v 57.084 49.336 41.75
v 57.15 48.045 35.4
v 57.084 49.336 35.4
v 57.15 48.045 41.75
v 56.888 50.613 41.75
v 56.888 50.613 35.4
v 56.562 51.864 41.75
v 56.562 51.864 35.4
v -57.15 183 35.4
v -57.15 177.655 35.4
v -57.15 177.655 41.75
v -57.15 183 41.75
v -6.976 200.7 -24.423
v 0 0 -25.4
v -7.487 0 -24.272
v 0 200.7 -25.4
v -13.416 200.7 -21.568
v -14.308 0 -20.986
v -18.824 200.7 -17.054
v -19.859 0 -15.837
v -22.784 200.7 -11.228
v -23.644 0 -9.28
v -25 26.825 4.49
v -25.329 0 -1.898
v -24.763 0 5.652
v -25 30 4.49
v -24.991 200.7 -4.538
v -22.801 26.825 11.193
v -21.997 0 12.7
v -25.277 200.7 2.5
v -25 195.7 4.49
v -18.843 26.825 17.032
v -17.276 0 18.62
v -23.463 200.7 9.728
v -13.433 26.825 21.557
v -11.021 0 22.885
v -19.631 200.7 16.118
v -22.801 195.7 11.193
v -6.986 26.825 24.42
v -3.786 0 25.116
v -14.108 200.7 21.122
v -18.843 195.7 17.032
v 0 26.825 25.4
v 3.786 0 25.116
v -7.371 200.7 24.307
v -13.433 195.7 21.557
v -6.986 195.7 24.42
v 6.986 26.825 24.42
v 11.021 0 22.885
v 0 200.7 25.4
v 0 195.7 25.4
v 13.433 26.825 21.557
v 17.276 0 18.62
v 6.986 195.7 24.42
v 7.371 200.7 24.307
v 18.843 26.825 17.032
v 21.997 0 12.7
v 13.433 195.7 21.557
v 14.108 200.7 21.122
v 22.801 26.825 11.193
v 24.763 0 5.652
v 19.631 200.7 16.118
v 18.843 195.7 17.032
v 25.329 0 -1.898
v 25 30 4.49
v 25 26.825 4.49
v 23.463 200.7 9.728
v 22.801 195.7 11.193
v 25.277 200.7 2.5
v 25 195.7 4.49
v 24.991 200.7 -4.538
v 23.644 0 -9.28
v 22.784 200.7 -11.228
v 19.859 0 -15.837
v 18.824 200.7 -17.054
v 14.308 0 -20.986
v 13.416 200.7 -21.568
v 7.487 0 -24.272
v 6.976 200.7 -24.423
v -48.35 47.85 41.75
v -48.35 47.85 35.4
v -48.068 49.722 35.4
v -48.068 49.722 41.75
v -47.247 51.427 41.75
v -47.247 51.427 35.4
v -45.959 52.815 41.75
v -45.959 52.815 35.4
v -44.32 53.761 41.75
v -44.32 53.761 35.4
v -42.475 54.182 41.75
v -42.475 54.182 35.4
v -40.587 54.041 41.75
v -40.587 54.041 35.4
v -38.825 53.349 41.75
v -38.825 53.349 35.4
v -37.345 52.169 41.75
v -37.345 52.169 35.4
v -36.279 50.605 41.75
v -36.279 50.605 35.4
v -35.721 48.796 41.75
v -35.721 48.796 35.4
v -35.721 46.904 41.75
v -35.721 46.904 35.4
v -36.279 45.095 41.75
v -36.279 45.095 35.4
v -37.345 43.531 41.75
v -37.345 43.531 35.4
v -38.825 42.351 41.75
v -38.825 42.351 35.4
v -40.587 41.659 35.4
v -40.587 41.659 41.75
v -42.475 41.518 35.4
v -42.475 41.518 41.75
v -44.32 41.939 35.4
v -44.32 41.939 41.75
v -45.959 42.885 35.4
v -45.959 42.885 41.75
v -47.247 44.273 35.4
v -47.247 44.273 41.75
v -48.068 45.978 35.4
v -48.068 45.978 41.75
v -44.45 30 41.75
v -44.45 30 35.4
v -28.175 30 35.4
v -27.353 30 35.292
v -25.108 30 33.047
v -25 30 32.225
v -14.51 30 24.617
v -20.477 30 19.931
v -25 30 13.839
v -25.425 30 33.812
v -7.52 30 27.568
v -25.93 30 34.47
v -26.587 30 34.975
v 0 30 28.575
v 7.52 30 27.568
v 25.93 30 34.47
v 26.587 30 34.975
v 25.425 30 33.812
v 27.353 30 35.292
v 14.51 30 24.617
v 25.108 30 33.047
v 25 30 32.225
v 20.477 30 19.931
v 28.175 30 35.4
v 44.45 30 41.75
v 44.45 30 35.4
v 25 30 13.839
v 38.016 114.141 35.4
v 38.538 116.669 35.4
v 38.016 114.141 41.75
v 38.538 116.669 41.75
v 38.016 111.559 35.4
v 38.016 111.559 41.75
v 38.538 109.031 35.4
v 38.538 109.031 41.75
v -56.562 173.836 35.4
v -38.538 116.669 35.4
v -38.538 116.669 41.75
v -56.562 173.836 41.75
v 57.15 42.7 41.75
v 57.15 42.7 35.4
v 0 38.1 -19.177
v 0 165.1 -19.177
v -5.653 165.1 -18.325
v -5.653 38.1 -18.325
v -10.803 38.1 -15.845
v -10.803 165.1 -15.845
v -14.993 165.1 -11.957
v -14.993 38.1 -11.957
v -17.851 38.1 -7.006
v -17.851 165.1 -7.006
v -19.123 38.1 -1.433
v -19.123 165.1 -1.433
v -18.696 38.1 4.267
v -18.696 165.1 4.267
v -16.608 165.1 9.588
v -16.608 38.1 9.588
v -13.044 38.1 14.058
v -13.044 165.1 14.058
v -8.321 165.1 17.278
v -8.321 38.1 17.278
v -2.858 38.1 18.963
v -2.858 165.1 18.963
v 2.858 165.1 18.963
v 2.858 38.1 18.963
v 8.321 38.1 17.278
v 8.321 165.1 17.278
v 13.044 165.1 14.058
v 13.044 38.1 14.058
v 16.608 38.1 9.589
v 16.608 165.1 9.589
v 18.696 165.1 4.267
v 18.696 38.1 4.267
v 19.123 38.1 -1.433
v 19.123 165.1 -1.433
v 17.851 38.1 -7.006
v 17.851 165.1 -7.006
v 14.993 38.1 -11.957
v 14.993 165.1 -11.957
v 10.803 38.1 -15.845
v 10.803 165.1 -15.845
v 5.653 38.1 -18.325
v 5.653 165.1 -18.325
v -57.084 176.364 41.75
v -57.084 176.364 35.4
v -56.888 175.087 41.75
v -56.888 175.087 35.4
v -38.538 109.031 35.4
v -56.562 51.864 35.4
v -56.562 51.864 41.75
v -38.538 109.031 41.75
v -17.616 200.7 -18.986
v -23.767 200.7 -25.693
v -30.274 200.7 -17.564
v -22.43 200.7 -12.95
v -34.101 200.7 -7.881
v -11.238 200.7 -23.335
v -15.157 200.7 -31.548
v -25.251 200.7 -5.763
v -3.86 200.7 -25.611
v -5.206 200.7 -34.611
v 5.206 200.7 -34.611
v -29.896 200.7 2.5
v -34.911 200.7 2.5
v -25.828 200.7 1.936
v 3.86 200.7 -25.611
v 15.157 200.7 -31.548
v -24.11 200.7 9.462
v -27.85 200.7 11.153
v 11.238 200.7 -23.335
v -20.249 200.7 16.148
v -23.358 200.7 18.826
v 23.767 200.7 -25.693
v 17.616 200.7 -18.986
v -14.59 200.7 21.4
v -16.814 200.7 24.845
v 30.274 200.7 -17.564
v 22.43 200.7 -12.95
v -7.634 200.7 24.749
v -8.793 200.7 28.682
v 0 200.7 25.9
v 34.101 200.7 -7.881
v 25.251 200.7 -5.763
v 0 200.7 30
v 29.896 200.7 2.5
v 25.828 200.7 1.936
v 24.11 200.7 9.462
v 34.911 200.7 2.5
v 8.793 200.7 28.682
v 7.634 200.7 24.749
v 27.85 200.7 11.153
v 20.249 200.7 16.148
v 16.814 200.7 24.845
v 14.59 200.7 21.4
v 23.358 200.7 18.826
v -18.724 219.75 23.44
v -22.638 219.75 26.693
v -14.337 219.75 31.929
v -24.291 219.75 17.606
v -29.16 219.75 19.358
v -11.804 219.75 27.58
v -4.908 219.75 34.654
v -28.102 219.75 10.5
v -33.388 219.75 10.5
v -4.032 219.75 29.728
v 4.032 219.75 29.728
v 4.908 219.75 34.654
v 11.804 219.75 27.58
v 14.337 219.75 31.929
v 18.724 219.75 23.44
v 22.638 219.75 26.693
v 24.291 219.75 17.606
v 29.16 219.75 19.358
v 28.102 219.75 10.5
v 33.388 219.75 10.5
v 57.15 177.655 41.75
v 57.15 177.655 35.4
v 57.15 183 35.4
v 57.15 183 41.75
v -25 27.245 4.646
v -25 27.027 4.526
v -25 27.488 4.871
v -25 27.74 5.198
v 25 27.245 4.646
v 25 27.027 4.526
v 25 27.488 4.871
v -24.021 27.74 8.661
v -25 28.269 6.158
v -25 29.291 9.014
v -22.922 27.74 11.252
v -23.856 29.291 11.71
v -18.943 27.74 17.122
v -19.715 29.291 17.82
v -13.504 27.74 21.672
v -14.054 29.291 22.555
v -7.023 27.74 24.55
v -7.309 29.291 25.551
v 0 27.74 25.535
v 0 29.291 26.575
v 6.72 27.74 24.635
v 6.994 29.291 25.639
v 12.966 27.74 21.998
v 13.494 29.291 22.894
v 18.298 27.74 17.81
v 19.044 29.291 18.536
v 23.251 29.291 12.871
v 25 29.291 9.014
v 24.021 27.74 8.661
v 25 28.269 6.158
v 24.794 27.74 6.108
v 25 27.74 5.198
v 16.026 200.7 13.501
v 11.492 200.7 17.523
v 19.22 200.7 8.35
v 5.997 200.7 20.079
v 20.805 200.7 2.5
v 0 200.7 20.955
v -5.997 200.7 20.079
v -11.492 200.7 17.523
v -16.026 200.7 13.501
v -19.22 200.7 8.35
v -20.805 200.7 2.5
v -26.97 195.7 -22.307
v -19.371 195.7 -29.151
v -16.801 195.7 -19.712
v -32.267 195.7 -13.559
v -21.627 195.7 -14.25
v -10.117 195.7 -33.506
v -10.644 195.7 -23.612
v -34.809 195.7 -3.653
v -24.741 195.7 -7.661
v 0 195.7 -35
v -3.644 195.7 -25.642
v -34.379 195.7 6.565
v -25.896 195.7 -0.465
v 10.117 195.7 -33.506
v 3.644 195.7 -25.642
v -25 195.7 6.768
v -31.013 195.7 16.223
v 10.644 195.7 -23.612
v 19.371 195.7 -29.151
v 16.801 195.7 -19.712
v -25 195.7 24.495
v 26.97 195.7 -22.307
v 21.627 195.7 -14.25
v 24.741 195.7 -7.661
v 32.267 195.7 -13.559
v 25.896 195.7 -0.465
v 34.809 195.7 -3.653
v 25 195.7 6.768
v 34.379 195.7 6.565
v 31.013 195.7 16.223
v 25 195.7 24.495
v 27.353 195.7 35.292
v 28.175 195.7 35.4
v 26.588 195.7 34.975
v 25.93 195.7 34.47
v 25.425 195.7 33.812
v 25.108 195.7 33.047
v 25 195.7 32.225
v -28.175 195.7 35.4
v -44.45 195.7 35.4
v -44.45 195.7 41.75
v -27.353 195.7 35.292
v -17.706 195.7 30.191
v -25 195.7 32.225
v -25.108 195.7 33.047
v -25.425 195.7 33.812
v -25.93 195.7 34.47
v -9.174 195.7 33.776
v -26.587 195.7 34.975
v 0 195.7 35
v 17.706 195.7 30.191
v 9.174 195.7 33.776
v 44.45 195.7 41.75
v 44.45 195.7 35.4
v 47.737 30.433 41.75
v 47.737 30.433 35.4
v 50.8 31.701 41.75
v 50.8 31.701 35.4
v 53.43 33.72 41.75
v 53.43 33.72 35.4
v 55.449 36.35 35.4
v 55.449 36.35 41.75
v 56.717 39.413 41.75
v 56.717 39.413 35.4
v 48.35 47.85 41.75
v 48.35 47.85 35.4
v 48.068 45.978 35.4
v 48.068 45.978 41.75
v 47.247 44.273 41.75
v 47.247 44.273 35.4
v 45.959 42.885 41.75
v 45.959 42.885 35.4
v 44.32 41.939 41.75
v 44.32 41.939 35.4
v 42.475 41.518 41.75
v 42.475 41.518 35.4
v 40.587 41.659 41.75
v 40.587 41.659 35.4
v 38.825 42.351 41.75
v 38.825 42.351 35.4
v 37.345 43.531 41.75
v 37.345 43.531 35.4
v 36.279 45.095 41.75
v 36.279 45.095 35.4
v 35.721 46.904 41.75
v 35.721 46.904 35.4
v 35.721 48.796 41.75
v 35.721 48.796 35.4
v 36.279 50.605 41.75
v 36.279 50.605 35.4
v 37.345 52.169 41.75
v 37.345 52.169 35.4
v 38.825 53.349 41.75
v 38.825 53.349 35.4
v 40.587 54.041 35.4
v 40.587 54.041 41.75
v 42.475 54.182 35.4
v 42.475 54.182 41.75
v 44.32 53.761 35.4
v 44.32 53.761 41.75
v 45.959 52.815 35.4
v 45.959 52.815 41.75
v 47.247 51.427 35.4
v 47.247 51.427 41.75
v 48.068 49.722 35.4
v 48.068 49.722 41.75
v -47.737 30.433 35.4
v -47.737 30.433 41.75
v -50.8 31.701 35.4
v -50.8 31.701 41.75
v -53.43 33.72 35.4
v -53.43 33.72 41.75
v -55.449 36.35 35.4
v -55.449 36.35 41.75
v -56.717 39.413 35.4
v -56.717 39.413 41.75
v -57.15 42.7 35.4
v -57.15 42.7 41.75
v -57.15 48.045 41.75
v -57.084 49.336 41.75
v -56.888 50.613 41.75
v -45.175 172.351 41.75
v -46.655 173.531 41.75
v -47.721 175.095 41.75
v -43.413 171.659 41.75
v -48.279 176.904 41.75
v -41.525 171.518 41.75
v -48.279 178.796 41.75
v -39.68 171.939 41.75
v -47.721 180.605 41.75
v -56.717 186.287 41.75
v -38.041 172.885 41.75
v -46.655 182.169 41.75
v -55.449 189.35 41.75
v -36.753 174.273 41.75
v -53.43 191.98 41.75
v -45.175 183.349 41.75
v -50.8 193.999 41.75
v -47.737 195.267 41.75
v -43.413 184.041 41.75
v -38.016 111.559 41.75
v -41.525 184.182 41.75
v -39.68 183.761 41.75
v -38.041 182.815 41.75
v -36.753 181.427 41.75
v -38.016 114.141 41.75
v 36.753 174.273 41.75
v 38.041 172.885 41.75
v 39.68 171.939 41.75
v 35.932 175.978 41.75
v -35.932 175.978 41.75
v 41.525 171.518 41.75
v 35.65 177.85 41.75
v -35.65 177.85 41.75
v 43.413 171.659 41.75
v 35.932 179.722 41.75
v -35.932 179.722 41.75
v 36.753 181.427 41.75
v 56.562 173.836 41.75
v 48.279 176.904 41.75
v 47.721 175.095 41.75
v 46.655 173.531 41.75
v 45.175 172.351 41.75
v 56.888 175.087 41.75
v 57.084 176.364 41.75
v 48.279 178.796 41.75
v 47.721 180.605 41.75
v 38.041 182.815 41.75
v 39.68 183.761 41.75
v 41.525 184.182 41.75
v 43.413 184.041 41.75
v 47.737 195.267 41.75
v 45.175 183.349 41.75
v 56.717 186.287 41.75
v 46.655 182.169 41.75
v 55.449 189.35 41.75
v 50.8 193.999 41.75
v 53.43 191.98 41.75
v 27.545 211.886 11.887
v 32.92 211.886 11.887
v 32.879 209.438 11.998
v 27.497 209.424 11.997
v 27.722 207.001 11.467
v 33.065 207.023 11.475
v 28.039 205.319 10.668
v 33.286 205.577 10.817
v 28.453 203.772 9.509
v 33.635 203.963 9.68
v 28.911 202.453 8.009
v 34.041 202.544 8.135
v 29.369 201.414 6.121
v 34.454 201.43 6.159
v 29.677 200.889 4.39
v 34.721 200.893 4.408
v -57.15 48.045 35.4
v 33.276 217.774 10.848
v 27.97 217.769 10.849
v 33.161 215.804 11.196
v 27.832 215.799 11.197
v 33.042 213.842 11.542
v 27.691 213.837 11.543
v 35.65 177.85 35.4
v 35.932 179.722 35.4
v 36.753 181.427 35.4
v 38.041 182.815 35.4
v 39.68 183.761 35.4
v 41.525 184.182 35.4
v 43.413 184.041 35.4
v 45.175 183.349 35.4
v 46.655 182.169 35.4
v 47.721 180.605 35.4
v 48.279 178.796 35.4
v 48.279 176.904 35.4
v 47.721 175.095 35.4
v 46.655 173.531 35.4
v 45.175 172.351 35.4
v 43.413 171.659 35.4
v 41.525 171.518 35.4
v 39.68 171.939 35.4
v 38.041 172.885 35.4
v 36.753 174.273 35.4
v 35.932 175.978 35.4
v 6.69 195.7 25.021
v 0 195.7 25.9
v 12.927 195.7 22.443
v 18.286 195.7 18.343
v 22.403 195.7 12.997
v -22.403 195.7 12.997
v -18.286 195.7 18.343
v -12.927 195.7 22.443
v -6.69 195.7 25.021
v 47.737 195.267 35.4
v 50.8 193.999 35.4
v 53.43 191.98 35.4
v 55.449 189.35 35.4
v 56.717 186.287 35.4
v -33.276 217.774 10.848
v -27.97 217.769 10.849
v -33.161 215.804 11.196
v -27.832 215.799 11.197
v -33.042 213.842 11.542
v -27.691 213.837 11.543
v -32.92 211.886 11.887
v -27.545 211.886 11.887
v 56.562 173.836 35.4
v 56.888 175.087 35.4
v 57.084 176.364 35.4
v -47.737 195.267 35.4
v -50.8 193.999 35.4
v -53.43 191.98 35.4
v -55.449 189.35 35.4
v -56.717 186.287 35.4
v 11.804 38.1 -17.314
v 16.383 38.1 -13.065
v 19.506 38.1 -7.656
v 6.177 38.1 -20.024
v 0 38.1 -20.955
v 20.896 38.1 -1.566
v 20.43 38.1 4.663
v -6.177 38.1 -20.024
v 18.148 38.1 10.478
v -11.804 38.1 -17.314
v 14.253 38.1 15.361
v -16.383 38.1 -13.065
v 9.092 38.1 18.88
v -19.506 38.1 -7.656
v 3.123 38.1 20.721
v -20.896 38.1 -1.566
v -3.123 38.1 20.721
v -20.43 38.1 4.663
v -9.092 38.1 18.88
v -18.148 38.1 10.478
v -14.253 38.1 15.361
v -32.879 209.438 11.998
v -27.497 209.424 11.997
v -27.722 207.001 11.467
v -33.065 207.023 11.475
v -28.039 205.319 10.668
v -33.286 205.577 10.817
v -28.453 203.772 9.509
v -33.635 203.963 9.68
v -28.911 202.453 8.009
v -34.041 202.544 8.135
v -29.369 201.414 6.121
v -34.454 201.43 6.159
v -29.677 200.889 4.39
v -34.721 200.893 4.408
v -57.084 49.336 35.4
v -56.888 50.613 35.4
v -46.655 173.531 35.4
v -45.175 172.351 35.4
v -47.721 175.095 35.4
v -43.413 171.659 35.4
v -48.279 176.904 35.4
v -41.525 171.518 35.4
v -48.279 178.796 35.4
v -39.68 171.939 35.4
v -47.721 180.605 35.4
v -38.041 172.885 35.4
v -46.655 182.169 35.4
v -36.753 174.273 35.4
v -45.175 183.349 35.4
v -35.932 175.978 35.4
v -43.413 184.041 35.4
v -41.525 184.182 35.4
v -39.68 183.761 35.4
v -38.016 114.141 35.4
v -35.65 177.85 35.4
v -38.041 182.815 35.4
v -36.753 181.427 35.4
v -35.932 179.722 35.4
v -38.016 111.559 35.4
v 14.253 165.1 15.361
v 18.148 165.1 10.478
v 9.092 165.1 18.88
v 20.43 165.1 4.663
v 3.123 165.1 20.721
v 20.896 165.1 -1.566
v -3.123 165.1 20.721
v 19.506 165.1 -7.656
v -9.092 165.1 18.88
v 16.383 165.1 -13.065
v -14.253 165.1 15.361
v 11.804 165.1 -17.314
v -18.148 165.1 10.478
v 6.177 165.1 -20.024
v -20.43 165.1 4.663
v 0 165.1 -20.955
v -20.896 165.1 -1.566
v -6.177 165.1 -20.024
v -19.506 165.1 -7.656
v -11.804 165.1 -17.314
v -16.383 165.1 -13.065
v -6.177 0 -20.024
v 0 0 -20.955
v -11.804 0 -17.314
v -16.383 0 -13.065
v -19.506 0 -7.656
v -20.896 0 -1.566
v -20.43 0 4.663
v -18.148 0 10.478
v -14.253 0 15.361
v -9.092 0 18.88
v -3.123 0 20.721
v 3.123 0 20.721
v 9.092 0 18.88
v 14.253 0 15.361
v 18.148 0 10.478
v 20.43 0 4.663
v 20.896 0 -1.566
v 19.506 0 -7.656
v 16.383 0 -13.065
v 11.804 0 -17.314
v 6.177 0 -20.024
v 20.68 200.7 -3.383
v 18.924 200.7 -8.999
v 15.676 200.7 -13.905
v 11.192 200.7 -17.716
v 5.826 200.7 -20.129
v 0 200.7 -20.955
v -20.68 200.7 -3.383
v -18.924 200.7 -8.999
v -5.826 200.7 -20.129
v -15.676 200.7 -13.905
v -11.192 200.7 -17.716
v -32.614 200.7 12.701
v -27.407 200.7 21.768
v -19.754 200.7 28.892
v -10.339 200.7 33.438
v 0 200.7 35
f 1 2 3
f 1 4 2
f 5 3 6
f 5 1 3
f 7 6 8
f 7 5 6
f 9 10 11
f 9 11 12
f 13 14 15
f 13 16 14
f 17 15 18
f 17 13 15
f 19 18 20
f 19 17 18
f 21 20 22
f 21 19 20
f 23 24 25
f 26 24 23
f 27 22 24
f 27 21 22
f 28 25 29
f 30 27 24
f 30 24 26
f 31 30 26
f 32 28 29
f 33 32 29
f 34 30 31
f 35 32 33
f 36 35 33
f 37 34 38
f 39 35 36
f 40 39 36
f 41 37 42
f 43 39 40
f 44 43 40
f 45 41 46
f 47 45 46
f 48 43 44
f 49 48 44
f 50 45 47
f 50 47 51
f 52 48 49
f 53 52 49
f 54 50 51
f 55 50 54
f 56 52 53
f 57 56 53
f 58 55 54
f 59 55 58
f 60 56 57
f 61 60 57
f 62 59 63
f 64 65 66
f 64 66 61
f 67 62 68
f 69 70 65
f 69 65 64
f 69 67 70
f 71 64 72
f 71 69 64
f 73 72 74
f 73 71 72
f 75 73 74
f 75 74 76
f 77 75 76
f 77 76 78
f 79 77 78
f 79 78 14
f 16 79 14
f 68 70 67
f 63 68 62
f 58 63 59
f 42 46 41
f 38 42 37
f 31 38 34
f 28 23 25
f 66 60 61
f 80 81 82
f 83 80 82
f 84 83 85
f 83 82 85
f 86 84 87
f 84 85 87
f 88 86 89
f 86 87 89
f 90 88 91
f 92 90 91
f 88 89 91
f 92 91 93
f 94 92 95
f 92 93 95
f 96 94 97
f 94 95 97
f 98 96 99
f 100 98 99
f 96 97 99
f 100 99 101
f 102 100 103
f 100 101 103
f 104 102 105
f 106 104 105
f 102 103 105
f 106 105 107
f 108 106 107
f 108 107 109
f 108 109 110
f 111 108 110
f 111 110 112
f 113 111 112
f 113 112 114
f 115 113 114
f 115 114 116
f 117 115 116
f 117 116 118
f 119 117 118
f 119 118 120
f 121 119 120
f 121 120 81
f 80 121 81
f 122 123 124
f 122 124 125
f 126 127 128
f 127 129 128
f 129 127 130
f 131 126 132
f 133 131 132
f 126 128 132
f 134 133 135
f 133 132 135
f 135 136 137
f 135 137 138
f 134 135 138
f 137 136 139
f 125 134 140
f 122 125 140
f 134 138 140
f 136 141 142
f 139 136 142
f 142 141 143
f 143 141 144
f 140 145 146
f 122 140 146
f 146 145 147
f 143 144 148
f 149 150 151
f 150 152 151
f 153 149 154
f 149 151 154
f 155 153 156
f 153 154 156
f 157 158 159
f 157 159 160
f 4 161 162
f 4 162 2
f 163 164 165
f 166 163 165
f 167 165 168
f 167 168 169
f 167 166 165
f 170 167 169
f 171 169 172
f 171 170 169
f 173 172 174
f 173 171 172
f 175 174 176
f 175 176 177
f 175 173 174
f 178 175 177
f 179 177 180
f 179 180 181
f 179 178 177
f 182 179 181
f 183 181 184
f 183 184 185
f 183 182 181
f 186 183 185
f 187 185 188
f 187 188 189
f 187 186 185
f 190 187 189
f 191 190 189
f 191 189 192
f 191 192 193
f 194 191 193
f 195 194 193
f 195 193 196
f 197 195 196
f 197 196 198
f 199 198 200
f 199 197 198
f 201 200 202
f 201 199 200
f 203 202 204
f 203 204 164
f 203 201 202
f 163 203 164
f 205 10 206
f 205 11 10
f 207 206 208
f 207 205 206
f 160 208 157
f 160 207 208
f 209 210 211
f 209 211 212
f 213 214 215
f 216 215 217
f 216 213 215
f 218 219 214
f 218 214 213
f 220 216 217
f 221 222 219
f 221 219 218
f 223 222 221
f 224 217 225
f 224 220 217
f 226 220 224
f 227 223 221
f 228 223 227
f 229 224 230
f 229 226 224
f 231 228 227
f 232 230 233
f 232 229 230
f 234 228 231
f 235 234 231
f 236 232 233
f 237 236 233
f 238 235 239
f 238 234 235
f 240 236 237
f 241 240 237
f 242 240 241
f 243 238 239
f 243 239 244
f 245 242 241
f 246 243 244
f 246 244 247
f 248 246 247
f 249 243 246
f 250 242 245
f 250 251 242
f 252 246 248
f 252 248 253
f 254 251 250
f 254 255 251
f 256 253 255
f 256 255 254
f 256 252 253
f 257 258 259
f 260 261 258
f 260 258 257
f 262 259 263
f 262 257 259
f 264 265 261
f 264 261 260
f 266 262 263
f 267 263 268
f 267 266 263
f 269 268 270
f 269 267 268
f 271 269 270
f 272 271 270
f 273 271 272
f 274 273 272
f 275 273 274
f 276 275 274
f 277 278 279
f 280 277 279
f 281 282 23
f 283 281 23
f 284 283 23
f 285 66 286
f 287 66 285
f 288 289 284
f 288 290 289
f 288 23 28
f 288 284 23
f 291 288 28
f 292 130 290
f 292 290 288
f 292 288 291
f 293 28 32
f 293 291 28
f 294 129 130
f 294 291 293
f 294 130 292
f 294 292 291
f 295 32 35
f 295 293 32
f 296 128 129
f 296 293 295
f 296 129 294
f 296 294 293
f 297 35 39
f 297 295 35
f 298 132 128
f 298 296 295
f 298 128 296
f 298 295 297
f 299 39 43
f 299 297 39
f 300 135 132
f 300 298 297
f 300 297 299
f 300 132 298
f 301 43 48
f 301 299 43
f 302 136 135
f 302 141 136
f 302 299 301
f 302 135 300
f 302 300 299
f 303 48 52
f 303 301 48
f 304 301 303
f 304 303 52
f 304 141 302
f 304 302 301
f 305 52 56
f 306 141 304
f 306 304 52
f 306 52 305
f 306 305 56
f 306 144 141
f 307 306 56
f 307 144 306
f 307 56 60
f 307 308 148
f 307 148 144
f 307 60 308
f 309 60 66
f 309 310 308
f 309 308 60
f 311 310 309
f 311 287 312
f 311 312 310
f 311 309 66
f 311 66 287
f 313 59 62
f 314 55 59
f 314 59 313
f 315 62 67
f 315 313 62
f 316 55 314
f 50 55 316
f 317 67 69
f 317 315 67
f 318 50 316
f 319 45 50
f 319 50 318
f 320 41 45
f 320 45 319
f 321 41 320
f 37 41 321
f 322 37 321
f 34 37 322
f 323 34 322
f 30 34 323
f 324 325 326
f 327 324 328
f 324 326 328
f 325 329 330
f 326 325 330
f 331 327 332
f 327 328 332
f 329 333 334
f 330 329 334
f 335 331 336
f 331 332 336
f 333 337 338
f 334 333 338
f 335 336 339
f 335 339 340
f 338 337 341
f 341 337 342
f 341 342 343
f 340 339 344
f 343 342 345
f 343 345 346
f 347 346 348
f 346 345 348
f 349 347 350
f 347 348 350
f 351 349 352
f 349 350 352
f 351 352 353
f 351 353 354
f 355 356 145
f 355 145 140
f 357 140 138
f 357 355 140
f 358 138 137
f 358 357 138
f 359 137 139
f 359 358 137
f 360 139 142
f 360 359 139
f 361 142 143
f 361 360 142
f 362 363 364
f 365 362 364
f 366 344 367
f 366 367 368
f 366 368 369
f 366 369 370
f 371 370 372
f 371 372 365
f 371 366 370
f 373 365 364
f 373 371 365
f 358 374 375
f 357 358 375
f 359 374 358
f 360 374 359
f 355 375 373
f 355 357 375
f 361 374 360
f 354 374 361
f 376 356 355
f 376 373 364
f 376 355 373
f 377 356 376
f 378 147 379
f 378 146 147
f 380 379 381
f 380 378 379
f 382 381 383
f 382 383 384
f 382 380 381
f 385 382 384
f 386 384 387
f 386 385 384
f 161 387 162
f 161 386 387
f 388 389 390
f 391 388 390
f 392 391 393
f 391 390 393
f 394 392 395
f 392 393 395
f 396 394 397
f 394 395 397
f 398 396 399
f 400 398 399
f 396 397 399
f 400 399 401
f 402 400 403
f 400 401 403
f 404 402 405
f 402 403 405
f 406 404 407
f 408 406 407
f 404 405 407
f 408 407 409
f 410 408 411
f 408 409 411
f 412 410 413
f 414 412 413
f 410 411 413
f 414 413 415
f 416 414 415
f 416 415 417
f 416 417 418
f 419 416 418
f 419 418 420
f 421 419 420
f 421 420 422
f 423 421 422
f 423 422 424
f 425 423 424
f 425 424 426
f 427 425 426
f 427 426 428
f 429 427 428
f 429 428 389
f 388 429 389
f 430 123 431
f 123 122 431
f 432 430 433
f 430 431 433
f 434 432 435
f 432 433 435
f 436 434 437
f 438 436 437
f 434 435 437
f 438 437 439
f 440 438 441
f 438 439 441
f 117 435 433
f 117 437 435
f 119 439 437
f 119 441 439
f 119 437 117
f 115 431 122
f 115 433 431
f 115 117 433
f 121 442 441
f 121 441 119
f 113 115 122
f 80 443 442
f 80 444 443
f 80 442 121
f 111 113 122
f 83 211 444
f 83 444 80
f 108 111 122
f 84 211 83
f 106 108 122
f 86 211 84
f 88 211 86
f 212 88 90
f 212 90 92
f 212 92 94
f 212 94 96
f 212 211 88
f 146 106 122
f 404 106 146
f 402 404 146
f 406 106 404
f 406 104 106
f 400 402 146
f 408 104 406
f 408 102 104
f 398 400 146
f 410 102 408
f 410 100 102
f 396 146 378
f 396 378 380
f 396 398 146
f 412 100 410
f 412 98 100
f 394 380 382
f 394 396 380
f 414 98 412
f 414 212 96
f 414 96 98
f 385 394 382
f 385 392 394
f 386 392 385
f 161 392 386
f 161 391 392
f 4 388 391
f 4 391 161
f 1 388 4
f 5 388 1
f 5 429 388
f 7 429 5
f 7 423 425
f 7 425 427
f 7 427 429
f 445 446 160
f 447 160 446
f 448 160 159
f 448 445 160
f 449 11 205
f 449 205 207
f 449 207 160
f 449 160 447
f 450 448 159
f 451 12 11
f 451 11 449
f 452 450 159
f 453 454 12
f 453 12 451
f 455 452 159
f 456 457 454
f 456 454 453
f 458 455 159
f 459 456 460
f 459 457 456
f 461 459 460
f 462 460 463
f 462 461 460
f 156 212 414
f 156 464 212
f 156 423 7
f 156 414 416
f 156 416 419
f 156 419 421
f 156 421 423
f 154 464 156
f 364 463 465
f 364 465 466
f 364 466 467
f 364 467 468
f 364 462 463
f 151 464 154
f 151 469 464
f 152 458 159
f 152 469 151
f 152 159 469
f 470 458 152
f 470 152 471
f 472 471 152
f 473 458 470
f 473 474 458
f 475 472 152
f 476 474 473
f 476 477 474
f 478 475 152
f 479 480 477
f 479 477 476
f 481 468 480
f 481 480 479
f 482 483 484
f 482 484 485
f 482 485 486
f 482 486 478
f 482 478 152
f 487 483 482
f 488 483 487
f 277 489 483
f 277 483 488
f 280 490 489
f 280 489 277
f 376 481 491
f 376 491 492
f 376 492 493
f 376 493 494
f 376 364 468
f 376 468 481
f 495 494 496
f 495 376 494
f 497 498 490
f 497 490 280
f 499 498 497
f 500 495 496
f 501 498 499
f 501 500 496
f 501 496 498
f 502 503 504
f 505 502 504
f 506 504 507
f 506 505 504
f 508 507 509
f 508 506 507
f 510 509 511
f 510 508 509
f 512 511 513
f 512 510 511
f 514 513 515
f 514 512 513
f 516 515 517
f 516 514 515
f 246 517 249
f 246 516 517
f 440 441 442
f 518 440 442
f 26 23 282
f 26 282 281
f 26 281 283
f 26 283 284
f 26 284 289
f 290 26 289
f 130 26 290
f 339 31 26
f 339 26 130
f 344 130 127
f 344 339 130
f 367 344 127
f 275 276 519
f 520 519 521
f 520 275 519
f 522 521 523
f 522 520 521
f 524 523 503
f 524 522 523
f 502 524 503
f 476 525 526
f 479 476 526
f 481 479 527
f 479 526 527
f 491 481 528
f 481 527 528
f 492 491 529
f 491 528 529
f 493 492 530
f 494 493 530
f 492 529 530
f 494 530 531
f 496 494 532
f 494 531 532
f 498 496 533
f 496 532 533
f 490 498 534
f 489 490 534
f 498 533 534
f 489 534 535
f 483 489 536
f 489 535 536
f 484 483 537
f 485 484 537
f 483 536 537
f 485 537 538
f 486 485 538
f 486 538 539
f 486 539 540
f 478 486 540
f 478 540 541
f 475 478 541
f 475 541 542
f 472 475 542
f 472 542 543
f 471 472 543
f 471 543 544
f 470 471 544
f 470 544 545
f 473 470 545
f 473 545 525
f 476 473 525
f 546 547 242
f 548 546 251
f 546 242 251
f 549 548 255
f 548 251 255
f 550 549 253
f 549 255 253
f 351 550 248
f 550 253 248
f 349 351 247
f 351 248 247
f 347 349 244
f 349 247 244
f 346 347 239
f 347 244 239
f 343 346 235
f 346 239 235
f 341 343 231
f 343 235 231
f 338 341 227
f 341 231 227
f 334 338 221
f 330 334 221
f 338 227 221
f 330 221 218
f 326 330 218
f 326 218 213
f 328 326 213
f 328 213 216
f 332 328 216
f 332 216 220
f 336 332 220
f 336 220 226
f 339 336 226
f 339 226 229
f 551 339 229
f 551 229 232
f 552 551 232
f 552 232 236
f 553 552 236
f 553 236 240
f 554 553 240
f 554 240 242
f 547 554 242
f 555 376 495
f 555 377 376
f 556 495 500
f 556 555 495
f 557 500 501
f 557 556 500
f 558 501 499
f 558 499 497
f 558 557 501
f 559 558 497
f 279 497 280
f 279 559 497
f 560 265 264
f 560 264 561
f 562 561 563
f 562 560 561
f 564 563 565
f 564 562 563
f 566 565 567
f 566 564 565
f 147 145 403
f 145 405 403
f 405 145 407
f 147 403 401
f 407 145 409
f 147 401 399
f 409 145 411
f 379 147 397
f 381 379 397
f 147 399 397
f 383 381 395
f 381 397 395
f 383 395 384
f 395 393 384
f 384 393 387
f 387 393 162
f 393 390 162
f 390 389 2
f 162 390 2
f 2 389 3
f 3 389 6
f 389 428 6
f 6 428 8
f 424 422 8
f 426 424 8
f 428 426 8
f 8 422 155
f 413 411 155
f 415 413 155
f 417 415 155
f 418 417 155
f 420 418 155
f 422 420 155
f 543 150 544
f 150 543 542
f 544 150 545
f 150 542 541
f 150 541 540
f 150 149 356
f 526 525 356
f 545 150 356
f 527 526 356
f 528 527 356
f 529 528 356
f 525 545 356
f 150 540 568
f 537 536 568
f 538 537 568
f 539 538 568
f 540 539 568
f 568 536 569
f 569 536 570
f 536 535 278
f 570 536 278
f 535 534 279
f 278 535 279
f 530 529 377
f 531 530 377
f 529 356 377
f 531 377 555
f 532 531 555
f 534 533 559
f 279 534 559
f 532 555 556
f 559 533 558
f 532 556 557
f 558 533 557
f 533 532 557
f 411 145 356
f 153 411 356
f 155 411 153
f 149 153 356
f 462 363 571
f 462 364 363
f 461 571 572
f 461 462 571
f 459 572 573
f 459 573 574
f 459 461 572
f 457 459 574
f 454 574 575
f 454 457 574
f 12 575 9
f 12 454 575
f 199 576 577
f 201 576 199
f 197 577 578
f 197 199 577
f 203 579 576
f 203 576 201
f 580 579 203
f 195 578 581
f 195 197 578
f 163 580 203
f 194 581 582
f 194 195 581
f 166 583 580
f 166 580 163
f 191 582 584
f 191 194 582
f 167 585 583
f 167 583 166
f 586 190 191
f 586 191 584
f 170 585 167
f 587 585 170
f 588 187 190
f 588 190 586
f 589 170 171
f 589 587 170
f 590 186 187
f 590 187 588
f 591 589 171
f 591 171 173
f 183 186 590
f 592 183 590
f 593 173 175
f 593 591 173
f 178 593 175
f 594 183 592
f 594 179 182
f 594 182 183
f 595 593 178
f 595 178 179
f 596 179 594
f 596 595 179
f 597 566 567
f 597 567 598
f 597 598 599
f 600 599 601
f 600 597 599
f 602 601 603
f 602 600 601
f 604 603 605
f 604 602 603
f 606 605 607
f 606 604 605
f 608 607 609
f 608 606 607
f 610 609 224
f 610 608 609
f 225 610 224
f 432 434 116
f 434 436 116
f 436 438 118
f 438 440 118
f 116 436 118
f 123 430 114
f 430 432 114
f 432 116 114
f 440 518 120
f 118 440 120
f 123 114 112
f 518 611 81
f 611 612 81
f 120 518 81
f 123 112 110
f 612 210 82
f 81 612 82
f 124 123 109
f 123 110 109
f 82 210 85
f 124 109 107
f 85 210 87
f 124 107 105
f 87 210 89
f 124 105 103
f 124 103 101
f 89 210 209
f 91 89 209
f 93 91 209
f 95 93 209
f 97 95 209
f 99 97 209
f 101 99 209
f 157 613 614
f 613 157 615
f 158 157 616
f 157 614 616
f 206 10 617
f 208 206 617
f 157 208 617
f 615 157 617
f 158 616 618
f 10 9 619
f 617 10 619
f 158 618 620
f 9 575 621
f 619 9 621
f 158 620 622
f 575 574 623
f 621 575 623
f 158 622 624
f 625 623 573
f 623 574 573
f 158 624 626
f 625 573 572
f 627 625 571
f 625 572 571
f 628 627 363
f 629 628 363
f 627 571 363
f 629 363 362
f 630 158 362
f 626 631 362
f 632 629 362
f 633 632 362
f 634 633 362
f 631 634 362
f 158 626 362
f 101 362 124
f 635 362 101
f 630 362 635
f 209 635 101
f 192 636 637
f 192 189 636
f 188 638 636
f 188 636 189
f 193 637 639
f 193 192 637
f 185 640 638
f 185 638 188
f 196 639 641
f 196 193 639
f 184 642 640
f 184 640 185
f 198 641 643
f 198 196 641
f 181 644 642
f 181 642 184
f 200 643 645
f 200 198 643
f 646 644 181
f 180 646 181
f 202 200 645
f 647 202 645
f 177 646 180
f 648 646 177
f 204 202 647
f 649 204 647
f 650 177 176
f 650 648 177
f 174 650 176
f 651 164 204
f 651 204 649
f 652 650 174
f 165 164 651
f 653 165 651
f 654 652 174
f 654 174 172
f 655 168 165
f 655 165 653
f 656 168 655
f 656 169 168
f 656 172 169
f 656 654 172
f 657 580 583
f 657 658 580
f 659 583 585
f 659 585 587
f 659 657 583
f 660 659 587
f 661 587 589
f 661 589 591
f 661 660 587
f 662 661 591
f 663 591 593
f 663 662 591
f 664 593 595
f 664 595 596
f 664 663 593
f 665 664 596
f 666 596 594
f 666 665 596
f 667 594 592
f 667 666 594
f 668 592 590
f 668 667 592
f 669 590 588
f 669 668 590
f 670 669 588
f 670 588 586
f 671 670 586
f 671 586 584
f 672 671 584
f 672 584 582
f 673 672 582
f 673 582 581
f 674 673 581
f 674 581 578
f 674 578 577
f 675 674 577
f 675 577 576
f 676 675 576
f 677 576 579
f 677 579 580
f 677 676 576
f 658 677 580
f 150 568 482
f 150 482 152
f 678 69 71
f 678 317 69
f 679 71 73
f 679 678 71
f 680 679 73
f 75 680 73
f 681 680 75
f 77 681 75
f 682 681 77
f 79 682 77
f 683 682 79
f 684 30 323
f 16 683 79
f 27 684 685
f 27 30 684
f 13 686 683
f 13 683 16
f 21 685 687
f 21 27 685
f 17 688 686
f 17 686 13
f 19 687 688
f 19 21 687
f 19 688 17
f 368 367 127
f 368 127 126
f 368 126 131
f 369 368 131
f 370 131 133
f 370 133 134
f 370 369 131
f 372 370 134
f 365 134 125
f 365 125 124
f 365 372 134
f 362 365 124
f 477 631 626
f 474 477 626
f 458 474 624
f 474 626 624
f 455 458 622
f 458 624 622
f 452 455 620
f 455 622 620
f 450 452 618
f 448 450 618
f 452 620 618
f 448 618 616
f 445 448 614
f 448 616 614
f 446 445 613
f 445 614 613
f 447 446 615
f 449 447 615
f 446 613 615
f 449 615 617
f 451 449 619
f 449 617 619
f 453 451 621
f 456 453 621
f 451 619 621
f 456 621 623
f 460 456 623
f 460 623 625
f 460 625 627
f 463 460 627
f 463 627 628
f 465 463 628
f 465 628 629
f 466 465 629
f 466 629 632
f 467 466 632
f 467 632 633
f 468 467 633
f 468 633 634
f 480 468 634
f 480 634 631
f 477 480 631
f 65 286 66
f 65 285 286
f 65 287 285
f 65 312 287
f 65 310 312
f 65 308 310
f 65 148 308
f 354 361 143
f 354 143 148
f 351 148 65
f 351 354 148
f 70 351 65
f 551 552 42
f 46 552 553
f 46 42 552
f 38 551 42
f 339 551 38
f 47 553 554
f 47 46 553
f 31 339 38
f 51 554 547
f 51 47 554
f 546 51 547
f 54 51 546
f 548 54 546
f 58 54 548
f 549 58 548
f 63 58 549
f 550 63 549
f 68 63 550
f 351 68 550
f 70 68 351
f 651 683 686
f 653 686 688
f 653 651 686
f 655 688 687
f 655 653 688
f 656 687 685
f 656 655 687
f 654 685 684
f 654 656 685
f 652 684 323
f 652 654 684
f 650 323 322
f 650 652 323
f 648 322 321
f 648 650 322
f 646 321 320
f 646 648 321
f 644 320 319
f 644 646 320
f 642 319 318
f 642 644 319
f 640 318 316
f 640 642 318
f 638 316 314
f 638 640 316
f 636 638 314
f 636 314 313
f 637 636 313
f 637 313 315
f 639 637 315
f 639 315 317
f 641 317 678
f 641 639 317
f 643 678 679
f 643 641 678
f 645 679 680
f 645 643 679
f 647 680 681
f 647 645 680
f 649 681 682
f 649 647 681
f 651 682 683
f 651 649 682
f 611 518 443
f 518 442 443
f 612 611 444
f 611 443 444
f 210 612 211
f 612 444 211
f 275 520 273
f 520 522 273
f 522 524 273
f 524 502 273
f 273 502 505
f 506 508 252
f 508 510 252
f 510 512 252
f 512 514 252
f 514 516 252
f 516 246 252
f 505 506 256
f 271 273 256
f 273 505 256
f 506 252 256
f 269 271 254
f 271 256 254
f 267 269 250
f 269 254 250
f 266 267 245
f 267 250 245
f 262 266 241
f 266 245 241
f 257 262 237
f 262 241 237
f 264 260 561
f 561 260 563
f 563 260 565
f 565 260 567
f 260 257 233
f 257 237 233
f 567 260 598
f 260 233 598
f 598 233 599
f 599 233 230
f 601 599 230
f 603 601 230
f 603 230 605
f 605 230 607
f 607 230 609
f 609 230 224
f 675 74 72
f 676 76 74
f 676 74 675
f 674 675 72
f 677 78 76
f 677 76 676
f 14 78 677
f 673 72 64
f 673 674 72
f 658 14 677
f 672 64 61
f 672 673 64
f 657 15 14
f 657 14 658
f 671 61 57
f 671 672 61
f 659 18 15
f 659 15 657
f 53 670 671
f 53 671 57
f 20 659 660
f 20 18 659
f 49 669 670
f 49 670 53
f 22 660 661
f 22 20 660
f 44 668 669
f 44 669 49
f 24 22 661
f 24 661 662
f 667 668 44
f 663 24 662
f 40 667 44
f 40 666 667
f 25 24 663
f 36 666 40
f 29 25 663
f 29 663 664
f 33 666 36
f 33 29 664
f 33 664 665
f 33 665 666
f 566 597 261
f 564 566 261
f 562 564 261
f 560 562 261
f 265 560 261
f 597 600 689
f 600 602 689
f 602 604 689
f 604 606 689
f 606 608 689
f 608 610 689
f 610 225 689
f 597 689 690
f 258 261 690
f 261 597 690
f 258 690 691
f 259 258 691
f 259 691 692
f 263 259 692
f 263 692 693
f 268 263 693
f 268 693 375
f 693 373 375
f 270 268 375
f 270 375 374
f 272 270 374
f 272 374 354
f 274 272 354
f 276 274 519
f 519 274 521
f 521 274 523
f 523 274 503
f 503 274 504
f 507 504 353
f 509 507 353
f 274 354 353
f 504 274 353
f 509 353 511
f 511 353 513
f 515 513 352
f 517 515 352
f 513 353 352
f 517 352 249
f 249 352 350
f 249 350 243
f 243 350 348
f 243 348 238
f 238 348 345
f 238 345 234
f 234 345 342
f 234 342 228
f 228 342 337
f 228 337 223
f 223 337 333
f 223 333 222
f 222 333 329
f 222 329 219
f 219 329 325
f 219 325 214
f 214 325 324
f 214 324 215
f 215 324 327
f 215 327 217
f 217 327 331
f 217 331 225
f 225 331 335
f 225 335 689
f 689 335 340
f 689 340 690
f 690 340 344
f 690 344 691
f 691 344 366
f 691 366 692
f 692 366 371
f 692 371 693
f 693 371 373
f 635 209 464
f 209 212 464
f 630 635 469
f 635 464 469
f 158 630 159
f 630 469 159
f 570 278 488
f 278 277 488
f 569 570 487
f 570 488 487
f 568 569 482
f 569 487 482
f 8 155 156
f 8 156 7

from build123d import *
from build123d.topology import SkipClean

# Parameters (mm, degrees)
BOSS_EXTRUDE1_DEPTH      = 3.175
BOSS_EXTRUDE4_START      = 150.025
BOSS_EXTRUDE4_DEPTH      = 150.025
BOSS_EXTRUDE5_START      = 3.175
BOSS_EXTRUDE5_DEPTH      = 3.175
SKETCH18_W               = 114.3
SKETCH18_H               = 173.2
BOSS_EXTRUDE6_DEPTH      = 6.35
BOSS_EXTRUDE9_DEPTH      = 1.5875
BOSS_EXTRUDE9_DEPTH_BACK = 1.5875
SKETCH26_R               = 35
SKETCH26_R_2             = 25.899999994
BOSS_EXTRUDE7_DEPTH      = 5
BOSS_EXTRUDE8_DEPTH      = 19.05
CUT_EXTRUDE3_DEPTH       = 231.866297886
CUT_EXTRUDE3_DEPTH_BACK  = 231.866297886
BOSS_EXTRUDE10_START     = 150.025
BOSS_EXTRUDE10_DEPTH     = 150.025
BOSS_EXTRUDE11_START     = 9.325
BOSS_EXTRUDE11_DEPTH     = 9.325
SKETCH36_W               = 6.35
SKETCH36_H               = 7.5
CUT_EXTRUDE4_DEPTH       = 252.192386516
FILLET1_R                = 3.175
CUT_EXTRUDE5_DEPTH       = 238.723253055
FILLET2_R                = 12.7
SKETCH38_R               = 6.35
CUT_EXTRUDE6_DEPTH       = 238.723253055
SKETCH41_R               = 25.399999994
CUT_EXTRUDE8_DEPTH       = 213.813709708


with BuildPart() as part:
    # Sketch12 → Revolve1 (revolve)
    with BuildSketch(Plane.XY, mode=Mode.PRIVATE) as revolve1_sk:
        Polygon((-25.399999994, 0), (-25.399999994, 203.2), (-20.955, 203.2), (-20.955, 165.1), (-19.177, 165.1), (-19.177, 38.1), (-20.955, 38.1), (-20.955, 0), align=None)
    revolve(revolve1_sk.sketch.rotate(Axis((0, 0, 0), (0, 1, 0)), 270), axis=Axis((0, 0, 0), (0, 1, 0)))



with BuildPart() as body_2:
    # Sketch14 → Boss-Extrude1 (new body)
    with BuildSketch(Plane(origin=(0, 30, 0), x_dir=(-1, 0, 0), z_dir=(0, -1, 0))):
        with BuildLine():
            Line((-25, -4.489988829), (-25, -35.399999994))
            Line((-25, -35.399999994), (25, -35.399999994))
            Line((25, -35.399999994), (25, -4.489988829))
            ThreePointArc((25, -4.489988829), (0, -25.399999994), (-25, -4.489988829))
        make_face()
    extrude(amount=-BOSS_EXTRUDE1_DEPTH)

    # Sketch15 → Boss-Extrude4 (add)
    with BuildSketch(Plane(origin=(0, 33.175, 0), x_dir=(1, 0, 0), z_dir=(0, 1, 0)).offset(BOSS_EXTRUDE4_START)):
        with BuildLine():
            Line((-1.5875, -25.350342077), (-1.5875, -35.399999994))
            Line((-1.5875, -35.399999994), (1.5875, -35.399999994))
            Line((1.5875, -35.399999994), (1.5875, -25.350342077))
            ThreePointArc((1.5875, -25.350342077), (0, -25.399999994), (-1.5875, -25.350342077))
        make_face()
    extrude(amount=-BOSS_EXTRUDE4_DEPTH)

    # Sketch17 → Boss-Extrude5 (add)
    with BuildSketch(Plane(origin=(0, 183.2, 0), x_dir=(1, 0, 0), z_dir=(0, 1, 0)).offset(BOSS_EXTRUDE5_START)):
        with BuildLine():
            Line((25, -35.399999994), (25, -4.489988829))
            ThreePointArc((25, -4.489988829), (0, -25.399999994), (-25, -4.489988829))
            Line((-25, -4.489988829), (-25, -35.399999994))
            Line((-25, -35.399999994), (25, -35.399999994))
        make_face()
    extrude(amount=-BOSS_EXTRUDE5_DEPTH)

    # Sketch18 → Boss-Extrude6 (add)
    with BuildSketch(Plane.XY.offset(35.399999994)):
        with Locations((0, 116.6)):
            Rectangle(SKETCH18_W, SKETCH18_H)
    extrude(amount=BOSS_EXTRUDE6_DEPTH)


with BuildPart() as part_1:
    add(part.part)

    add(body_2.part)  # Boss-Extrude9 merges body 2
    # Sketch30 → Boss-Extrude9 (add, two sides: drawn at the far end of the back side and taken through both)
    with BuildSketch(Plane(origin=(0, 106.6, 0), x_dir=(-1, 0, 0), z_dir=(0, -1, 0)).offset(-BOSS_EXTRUDE9_DEPTH_BACK)):
        with BuildLine():
            Line((25, -35.399999994), (25, -4.489988829))
            ThreePointArc((25, -4.489988829), (0, -25.399999994), (-25, -4.489988829))
            Line((-25, -4.489988829), (-25, -35.399999994))
            Line((-25, -35.399999994), (25, -35.399999994))
        make_face()
    extrude(amount=BOSS_EXTRUDE9_DEPTH + BOSS_EXTRUDE9_DEPTH_BACK)


with BuildPart() as body_2_2:
    # Sketch26 → Boss-Extrude7 (new body)
    with BuildSketch(Plane(origin=(0, 200.7, 0), x_dir=(1, 0, 0), z_dir=(0, 1, 0))):
        with Locations(Location((0, 0, 0), (0, 0, 270))):
            Circle(SKETCH26_R)
        with Locations(Location((0, 0, 0), (0, 0, 270))):
            Circle(SKETCH26_R_2, mode=Mode.SUBTRACT)
    extrude(amount=-BOSS_EXTRUDE7_DEPTH)

    # Sketch26<3> → Boss-Extrude8 (add)
    with SkipClean():  # the faces are left unmerged after this step: merging them gives an invalid solid
        with BuildSketch(Plane(origin=(0, 200.7, 0), x_dir=(1, 0, 0), z_dir=(0, 1, 0))):
            with BuildLine():
                ThreePointArc((-34.910600109, -2.5), (0, -35), (34.910600109, -2.5))
                Line((34.910600109, -2.5), (29.895651858, -2.5))
                ThreePointArc((29.895651858, -2.5), (0, -30), (-29.895651858, -2.5))
                Line((-29.895651858, -2.5), (-34.910600109, -2.5))
            make_face()
        extrude(amount=BOSS_EXTRUDE8_DEPTH)


with BuildPart() as cut_extrude3_tool:
    # Sketch33 → Cut-Extrude3 (new, two sides: drawn at the far end of the back side and taken through both)
    with SkipClean():  # the faces are left unmerged after this step: merging them gives an invalid solid
        with BuildSketch(Plane(origin=(0, 0, 0), x_dir=(0, 0, -1), z_dir=(1, 0, 0)).offset(-CUT_EXTRUDE3_DEPTH_BACK)):
            with BuildLine():
                Line((-2.5, 219.75), (-2.99214107, 219.75))
                Line((-2.99214107, 219.75), (-10.5, 219.75))
                Line((-10.5, 219.75), (-11.8865543, 211.886459809))
                ThreePointArc((-11.8865543, 211.886459809), (-9.801443088, 204.104718827), (-2.5, 200.7))
                Line((-2.5, 200.7), (-2.5, 219.75))
            make_face()
        extrude(amount=CUT_EXTRUDE3_DEPTH + CUT_EXTRUDE3_DEPTH_BACK)


with BuildPart() as part_2:
    with SkipClean():  # the faces are left unmerged after this step: merging them gives an invalid solid
        add(part_1.part)

        # Cut-Extrude3: cut by cut_extrude3_tool
        add(cut_extrude3_tool.part, mode=Mode.SUBTRACT)

    # Sketch34 → Boss-Extrude10 (add)
    with BuildSketch(Plane(origin=(0, 33.175, 0), x_dir=(1, 0, 0), z_dir=(0, 1, 0)).offset(BOSS_EXTRUDE10_START)):
        with BuildLine():
            Line((-25, -35.399999994), (-1.5875, -35.399999994))
            Line((-1.5875, -35.399999994), (-1.5875, -25.350342077))
            ThreePointArc((-1.5875, -25.350342077), (-16.897111394, -18.964377823), (-25, -4.489988829))
            Line((-25, -4.489988829), (-25, -35.399999994))
        make_face()
        with BuildLine():
            Line((1.5875, -25.350342077), (1.5875, -35.399999994))
            Line((1.5875, -35.399999994), (25, -35.399999994))
            Line((25, -35.399999994), (25, -4.489988829))
            ThreePointArc((25, -4.489988829), (16.897111394, -18.964377823), (1.5875, -25.350342077))
        make_face()
    extrude(amount=-BOSS_EXTRUDE10_DEPTH)



with BuildPart() as body_2_2_1:
    with SkipClean():  # the faces are left unmerged after this step: merging them gives an invalid solid
        add(body_2_2.part)

        # Cut-Extrude3: cut by cut_extrude3_tool
        add(cut_extrude3_tool.part, mode=Mode.SUBTRACT)


with BuildPart() as part_3:
    with SkipClean():  # the faces are left unmerged after this step: merging them gives an invalid solid
        add(part_2.part)

        add(body_2_2_1.part)  # Boss-Extrude11 merges body 2 2
        # Sketch35 → Boss-Extrude11 (add)
        with BuildSketch(Plane(origin=(0, 186.375, 0), x_dir=(1, 0, 0), z_dir=(0, 1, 0)).offset(BOSS_EXTRUDE11_START)):
            with BuildLine():
                Line((-25, -35.399999994), (25, -35.399999994))
                Line((25, -35.399999994), (25, -4.489988829))
                ThreePointArc((25, -4.489988829), (0, -25.399999994), (-25, -4.489988829))
                Line((-25, -4.489988829), (-25, -35.399999994))
            make_face()
        extrude(amount=-BOSS_EXTRUDE11_DEPTH)

    # Sketch36 → Cut-Extrude4 (cut, through all)
    with SkipClean():  # the faces are left unmerged after this step: merging them gives an invalid solid
        with BuildSketch(Plane(origin=(57.15, 0, 0), x_dir=(0, 0, -1), z_dir=(1, 0, 0))):
            with Locations((-38.574999994, 199.45)):
                Rectangle(SKETCH36_W, SKETCH36_H)
        extrude(amount=-CUT_EXTRUDE4_DEPTH, mode=Mode.SUBTRACT)

    # Fillet1
    fillet1_edges = [part_3.edges().sort_by_distance(p)[0] for p in [
        (-25, 112.85, 35.399999994),
        (25, 112.85, 35.399999994),
        (0, 30, 25.399999994),
    ]]
    fillet(fillet1_edges, radius=FILLET1_R)

    # Sketch37 → Cut-Extrude5 (cut, through all)
    with SkipClean():  # the faces are left unmerged after this step: merging them gives an invalid solid
        with BuildSketch(Plane(origin=(0, 0, 35.399999994), x_dir=(-1, 0, 0), z_dir=(0, 0, -1))):
            Polygon((-57.15, 175.7), (-37.333471119, 112.85), (-57.15, 50), align=None)
            Polygon((57.15, 50), (37.333471119, 112.85), (57.15, 175.7), align=None)
        extrude(amount=-CUT_EXTRUDE5_DEPTH, mode=Mode.SUBTRACT)

    # Fillet2
    fillet2_edges = [part_3.edges().sort_by_distance(p)[0] for p in [
        (-57.15, 195.7, 38.574999994),
        (57.15, 195.7, 38.574999994),
        (-57.15, 50, 38.574999994),
        (-37.333471119, 112.85, 38.574999994),
        (-57.15, 175.7, 38.574999994),
        (37.333471119, 112.85, 38.574999994),
        (57.15, 50, 38.574999994),
        (57.15, 175.7, 38.574999994),
        (-57.15, 30, 38.574999994),
        (57.15, 30, 38.574999994),
    ]]
    fillet(fillet2_edges, radius=FILLET2_R)

    # Sketch38 → Cut-Extrude6 (cut, through all)
    with SkipClean():  # the faces are left unmerged after this step: merging them gives an invalid solid
        with BuildSketch(Plane(origin=(0, 0, 35.399999994), x_dir=(-1, 0, 0), z_dir=(0, 0, -1))):
            with Locations((-42, 177.85)):
                Circle(SKETCH38_R)
            with Locations(Location((42, 177.85, 0), (0, 0, 180))):
                Circle(SKETCH38_R)
            with Locations((42, 47.85)):
                Circle(SKETCH38_R)
            with Locations(Location((-42, 47.85, 0), (0, 0, 180))):
                Circle(SKETCH38_R)
        extrude(amount=-CUT_EXTRUDE6_DEPTH, mode=Mode.SUBTRACT)

    # Sketch41 → Cut-Extrude8 (cut, through all)
    with SkipClean():  # the faces are left unmerged after this step: merging them gives an invalid solid
        with BuildSketch(Plane(origin=(0, 200.7, 0), x_dir=(1, 0, 0), z_dir=(0, 1, 0))):
            with Locations(Location((0, 0, 0), (0, 0, 90))):
                Circle(SKETCH41_R)
        extrude(amount=CUT_EXTRUDE8_DEPTH, mode=Mode.SUBTRACT)


solid = part_3.part
